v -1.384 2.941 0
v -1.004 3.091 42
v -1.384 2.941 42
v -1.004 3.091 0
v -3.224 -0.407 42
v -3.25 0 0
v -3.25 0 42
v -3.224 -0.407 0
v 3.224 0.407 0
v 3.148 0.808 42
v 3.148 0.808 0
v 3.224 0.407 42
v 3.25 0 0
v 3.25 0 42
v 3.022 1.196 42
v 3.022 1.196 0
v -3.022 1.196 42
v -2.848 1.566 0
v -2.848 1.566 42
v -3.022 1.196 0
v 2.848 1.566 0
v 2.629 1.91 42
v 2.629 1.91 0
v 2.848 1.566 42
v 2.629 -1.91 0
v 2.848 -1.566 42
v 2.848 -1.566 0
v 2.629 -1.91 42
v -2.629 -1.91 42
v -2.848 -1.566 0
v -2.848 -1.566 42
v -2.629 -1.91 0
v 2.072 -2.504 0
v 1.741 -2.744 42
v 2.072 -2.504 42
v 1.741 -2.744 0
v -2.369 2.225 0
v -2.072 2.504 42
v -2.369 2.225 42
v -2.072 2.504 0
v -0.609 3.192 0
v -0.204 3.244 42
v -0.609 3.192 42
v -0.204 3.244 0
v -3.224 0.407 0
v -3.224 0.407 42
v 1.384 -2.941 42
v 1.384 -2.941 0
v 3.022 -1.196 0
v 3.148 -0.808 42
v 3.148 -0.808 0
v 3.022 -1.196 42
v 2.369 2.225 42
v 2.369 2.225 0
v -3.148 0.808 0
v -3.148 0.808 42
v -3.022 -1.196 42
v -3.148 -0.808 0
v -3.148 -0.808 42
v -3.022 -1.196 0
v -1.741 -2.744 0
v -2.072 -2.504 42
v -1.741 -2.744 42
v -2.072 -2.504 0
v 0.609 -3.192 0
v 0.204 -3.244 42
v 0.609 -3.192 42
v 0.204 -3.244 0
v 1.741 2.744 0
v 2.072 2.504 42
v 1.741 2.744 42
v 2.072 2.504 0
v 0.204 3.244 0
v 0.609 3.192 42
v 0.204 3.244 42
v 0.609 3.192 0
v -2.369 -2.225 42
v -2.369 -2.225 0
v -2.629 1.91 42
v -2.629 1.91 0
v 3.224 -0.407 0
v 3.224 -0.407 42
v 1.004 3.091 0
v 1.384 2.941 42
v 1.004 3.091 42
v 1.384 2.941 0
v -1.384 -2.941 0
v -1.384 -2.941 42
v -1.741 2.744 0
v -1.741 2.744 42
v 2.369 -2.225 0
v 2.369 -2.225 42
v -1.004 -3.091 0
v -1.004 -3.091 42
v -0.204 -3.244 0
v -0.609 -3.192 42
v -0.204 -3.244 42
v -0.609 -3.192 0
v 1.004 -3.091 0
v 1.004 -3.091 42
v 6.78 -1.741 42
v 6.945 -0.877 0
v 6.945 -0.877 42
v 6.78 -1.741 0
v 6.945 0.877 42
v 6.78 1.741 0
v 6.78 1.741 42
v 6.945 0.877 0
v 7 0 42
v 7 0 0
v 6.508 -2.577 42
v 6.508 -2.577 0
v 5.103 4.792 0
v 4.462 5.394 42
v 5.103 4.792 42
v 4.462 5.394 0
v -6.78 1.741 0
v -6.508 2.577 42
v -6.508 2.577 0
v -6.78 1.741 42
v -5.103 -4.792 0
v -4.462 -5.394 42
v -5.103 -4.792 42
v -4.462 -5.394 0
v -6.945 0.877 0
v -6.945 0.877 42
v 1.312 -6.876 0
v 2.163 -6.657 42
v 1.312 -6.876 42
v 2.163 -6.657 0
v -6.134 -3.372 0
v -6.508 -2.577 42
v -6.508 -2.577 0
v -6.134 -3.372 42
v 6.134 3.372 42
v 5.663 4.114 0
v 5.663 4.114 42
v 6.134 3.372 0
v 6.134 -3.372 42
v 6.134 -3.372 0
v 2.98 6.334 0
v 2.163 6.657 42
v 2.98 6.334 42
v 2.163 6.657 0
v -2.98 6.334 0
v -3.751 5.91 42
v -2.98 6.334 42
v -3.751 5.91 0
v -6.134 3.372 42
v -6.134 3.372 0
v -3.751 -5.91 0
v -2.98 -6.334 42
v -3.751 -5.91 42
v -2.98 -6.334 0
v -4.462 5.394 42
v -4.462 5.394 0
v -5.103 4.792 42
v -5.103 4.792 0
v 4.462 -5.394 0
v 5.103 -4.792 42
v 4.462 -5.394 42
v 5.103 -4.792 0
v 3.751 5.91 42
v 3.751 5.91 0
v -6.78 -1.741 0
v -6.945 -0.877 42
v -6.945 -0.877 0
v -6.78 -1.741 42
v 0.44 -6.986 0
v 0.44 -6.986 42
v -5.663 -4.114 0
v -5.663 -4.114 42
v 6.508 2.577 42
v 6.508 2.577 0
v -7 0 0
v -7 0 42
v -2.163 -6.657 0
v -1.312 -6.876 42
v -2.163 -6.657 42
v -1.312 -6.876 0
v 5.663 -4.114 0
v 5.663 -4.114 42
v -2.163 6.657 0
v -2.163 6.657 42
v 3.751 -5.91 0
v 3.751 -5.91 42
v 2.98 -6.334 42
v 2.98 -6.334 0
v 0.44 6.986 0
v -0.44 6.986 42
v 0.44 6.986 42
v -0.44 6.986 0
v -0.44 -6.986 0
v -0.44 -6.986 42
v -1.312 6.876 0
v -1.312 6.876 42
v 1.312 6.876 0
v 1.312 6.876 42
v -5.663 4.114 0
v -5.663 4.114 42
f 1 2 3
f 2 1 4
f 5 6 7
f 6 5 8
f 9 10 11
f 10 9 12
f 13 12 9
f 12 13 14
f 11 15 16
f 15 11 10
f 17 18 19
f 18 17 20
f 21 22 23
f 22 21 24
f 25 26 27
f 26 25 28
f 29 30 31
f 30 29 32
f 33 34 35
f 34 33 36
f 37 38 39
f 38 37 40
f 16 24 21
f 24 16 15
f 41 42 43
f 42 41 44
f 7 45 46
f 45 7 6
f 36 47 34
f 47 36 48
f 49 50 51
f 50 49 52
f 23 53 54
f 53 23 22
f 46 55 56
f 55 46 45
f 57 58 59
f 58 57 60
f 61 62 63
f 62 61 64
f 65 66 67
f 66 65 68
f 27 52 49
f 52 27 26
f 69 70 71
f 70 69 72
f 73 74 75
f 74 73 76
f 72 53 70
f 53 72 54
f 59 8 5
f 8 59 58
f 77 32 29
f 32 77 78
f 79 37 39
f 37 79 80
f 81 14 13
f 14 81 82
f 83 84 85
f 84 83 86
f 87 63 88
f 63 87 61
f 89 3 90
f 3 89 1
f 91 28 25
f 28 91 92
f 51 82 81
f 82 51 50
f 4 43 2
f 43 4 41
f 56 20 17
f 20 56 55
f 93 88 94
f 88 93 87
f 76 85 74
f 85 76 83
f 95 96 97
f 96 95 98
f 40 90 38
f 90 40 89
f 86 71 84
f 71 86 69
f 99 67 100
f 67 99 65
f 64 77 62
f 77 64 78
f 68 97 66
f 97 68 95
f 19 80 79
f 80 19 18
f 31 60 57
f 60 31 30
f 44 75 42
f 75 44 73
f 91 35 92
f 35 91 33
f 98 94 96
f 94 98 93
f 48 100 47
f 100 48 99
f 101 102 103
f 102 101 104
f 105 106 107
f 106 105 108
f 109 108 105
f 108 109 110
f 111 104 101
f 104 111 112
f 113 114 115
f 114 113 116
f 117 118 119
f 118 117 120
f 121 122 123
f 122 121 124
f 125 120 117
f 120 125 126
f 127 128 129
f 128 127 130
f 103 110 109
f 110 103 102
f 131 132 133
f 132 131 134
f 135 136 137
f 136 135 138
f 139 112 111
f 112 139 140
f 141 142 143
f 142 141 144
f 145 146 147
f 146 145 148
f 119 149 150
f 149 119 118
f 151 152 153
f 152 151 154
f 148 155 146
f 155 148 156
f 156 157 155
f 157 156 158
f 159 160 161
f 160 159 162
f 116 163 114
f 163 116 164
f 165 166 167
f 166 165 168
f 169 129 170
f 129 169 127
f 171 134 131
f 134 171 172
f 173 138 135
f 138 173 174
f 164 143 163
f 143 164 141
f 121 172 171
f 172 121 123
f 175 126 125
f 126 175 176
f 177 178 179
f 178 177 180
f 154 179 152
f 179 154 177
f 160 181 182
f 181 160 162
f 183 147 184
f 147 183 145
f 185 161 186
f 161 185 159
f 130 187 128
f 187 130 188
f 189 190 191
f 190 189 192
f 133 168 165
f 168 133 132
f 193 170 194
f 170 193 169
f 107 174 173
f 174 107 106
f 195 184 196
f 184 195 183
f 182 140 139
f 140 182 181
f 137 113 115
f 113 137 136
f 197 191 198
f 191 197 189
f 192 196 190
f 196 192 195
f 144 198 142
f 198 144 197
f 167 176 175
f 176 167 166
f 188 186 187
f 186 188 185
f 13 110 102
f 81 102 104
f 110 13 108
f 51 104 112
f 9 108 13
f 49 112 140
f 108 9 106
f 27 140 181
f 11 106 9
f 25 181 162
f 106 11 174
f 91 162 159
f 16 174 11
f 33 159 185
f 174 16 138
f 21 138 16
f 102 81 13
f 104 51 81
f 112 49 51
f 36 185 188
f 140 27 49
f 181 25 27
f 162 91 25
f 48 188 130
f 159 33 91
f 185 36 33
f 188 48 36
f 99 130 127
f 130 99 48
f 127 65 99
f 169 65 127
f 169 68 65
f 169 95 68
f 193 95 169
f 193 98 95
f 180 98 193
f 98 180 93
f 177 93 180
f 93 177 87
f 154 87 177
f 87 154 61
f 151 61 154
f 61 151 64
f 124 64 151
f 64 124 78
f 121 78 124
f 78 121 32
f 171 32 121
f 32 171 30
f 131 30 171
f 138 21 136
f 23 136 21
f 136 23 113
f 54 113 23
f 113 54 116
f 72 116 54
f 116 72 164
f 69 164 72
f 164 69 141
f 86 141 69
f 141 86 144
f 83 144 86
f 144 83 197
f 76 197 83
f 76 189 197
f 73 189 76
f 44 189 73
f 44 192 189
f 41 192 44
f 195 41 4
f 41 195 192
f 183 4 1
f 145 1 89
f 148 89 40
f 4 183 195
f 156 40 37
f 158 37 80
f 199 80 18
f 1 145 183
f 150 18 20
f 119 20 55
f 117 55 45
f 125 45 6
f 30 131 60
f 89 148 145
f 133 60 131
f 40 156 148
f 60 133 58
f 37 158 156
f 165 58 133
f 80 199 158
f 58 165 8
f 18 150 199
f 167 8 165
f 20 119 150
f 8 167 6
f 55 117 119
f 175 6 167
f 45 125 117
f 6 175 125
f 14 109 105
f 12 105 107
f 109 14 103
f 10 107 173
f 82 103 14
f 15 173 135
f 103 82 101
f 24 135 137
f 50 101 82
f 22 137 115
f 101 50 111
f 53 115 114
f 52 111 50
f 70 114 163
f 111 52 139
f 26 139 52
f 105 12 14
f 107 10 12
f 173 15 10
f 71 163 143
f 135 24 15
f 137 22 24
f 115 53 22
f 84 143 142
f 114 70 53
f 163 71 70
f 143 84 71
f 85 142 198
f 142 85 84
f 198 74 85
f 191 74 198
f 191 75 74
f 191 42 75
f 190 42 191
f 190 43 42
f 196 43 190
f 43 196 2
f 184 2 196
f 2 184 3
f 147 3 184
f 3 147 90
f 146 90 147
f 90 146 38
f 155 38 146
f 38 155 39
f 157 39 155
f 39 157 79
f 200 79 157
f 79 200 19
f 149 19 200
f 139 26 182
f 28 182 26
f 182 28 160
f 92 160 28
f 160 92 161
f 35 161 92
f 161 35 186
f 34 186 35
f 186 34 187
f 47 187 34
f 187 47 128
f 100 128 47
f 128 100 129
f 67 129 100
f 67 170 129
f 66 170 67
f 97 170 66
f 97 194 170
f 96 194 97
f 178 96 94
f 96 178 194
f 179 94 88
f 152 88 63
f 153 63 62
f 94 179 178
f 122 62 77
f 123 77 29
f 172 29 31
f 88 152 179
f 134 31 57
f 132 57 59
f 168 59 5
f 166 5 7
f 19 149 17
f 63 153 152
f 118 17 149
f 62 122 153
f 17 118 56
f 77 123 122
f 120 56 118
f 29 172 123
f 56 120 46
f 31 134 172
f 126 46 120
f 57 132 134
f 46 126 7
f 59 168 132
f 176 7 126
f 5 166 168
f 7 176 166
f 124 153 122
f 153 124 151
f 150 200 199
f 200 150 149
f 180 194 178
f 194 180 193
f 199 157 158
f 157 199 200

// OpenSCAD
$fn = 50;


difference() {
	union() {
		*color(alpha = 1.0000000000, c = "gray") {
			translate(v = [0, 7, 0]) {
				linear_extrude(height = 1) {
					text(font = "Arial:style=Bold", halign = "center", size = 4.5000000000, text = "COMMENT plate main", valign = "center");
				}
			}
		}
		cylinder(h = 42, r = 7.0000000000);
	}
	union() {
		*color(alpha = 1.0000000000, c = "gray") {
			translate(v = [0, 7, 0]) {
				linear_extrude(height = 1) {
					text(font = "Arial:style=Bold", halign = "center", size = 4.5000000000, text = "COMMENT holes main", valign = "center");
				}
			}
		}
		translate(v = [0, 0, -100]) {
			cylinder(h = 200, r = 3.2500000000);
		}
		translate(v = [0, 0, -100]) {
			cylinder(h = 200, r = 1.8000000000);
		}
	}
}
